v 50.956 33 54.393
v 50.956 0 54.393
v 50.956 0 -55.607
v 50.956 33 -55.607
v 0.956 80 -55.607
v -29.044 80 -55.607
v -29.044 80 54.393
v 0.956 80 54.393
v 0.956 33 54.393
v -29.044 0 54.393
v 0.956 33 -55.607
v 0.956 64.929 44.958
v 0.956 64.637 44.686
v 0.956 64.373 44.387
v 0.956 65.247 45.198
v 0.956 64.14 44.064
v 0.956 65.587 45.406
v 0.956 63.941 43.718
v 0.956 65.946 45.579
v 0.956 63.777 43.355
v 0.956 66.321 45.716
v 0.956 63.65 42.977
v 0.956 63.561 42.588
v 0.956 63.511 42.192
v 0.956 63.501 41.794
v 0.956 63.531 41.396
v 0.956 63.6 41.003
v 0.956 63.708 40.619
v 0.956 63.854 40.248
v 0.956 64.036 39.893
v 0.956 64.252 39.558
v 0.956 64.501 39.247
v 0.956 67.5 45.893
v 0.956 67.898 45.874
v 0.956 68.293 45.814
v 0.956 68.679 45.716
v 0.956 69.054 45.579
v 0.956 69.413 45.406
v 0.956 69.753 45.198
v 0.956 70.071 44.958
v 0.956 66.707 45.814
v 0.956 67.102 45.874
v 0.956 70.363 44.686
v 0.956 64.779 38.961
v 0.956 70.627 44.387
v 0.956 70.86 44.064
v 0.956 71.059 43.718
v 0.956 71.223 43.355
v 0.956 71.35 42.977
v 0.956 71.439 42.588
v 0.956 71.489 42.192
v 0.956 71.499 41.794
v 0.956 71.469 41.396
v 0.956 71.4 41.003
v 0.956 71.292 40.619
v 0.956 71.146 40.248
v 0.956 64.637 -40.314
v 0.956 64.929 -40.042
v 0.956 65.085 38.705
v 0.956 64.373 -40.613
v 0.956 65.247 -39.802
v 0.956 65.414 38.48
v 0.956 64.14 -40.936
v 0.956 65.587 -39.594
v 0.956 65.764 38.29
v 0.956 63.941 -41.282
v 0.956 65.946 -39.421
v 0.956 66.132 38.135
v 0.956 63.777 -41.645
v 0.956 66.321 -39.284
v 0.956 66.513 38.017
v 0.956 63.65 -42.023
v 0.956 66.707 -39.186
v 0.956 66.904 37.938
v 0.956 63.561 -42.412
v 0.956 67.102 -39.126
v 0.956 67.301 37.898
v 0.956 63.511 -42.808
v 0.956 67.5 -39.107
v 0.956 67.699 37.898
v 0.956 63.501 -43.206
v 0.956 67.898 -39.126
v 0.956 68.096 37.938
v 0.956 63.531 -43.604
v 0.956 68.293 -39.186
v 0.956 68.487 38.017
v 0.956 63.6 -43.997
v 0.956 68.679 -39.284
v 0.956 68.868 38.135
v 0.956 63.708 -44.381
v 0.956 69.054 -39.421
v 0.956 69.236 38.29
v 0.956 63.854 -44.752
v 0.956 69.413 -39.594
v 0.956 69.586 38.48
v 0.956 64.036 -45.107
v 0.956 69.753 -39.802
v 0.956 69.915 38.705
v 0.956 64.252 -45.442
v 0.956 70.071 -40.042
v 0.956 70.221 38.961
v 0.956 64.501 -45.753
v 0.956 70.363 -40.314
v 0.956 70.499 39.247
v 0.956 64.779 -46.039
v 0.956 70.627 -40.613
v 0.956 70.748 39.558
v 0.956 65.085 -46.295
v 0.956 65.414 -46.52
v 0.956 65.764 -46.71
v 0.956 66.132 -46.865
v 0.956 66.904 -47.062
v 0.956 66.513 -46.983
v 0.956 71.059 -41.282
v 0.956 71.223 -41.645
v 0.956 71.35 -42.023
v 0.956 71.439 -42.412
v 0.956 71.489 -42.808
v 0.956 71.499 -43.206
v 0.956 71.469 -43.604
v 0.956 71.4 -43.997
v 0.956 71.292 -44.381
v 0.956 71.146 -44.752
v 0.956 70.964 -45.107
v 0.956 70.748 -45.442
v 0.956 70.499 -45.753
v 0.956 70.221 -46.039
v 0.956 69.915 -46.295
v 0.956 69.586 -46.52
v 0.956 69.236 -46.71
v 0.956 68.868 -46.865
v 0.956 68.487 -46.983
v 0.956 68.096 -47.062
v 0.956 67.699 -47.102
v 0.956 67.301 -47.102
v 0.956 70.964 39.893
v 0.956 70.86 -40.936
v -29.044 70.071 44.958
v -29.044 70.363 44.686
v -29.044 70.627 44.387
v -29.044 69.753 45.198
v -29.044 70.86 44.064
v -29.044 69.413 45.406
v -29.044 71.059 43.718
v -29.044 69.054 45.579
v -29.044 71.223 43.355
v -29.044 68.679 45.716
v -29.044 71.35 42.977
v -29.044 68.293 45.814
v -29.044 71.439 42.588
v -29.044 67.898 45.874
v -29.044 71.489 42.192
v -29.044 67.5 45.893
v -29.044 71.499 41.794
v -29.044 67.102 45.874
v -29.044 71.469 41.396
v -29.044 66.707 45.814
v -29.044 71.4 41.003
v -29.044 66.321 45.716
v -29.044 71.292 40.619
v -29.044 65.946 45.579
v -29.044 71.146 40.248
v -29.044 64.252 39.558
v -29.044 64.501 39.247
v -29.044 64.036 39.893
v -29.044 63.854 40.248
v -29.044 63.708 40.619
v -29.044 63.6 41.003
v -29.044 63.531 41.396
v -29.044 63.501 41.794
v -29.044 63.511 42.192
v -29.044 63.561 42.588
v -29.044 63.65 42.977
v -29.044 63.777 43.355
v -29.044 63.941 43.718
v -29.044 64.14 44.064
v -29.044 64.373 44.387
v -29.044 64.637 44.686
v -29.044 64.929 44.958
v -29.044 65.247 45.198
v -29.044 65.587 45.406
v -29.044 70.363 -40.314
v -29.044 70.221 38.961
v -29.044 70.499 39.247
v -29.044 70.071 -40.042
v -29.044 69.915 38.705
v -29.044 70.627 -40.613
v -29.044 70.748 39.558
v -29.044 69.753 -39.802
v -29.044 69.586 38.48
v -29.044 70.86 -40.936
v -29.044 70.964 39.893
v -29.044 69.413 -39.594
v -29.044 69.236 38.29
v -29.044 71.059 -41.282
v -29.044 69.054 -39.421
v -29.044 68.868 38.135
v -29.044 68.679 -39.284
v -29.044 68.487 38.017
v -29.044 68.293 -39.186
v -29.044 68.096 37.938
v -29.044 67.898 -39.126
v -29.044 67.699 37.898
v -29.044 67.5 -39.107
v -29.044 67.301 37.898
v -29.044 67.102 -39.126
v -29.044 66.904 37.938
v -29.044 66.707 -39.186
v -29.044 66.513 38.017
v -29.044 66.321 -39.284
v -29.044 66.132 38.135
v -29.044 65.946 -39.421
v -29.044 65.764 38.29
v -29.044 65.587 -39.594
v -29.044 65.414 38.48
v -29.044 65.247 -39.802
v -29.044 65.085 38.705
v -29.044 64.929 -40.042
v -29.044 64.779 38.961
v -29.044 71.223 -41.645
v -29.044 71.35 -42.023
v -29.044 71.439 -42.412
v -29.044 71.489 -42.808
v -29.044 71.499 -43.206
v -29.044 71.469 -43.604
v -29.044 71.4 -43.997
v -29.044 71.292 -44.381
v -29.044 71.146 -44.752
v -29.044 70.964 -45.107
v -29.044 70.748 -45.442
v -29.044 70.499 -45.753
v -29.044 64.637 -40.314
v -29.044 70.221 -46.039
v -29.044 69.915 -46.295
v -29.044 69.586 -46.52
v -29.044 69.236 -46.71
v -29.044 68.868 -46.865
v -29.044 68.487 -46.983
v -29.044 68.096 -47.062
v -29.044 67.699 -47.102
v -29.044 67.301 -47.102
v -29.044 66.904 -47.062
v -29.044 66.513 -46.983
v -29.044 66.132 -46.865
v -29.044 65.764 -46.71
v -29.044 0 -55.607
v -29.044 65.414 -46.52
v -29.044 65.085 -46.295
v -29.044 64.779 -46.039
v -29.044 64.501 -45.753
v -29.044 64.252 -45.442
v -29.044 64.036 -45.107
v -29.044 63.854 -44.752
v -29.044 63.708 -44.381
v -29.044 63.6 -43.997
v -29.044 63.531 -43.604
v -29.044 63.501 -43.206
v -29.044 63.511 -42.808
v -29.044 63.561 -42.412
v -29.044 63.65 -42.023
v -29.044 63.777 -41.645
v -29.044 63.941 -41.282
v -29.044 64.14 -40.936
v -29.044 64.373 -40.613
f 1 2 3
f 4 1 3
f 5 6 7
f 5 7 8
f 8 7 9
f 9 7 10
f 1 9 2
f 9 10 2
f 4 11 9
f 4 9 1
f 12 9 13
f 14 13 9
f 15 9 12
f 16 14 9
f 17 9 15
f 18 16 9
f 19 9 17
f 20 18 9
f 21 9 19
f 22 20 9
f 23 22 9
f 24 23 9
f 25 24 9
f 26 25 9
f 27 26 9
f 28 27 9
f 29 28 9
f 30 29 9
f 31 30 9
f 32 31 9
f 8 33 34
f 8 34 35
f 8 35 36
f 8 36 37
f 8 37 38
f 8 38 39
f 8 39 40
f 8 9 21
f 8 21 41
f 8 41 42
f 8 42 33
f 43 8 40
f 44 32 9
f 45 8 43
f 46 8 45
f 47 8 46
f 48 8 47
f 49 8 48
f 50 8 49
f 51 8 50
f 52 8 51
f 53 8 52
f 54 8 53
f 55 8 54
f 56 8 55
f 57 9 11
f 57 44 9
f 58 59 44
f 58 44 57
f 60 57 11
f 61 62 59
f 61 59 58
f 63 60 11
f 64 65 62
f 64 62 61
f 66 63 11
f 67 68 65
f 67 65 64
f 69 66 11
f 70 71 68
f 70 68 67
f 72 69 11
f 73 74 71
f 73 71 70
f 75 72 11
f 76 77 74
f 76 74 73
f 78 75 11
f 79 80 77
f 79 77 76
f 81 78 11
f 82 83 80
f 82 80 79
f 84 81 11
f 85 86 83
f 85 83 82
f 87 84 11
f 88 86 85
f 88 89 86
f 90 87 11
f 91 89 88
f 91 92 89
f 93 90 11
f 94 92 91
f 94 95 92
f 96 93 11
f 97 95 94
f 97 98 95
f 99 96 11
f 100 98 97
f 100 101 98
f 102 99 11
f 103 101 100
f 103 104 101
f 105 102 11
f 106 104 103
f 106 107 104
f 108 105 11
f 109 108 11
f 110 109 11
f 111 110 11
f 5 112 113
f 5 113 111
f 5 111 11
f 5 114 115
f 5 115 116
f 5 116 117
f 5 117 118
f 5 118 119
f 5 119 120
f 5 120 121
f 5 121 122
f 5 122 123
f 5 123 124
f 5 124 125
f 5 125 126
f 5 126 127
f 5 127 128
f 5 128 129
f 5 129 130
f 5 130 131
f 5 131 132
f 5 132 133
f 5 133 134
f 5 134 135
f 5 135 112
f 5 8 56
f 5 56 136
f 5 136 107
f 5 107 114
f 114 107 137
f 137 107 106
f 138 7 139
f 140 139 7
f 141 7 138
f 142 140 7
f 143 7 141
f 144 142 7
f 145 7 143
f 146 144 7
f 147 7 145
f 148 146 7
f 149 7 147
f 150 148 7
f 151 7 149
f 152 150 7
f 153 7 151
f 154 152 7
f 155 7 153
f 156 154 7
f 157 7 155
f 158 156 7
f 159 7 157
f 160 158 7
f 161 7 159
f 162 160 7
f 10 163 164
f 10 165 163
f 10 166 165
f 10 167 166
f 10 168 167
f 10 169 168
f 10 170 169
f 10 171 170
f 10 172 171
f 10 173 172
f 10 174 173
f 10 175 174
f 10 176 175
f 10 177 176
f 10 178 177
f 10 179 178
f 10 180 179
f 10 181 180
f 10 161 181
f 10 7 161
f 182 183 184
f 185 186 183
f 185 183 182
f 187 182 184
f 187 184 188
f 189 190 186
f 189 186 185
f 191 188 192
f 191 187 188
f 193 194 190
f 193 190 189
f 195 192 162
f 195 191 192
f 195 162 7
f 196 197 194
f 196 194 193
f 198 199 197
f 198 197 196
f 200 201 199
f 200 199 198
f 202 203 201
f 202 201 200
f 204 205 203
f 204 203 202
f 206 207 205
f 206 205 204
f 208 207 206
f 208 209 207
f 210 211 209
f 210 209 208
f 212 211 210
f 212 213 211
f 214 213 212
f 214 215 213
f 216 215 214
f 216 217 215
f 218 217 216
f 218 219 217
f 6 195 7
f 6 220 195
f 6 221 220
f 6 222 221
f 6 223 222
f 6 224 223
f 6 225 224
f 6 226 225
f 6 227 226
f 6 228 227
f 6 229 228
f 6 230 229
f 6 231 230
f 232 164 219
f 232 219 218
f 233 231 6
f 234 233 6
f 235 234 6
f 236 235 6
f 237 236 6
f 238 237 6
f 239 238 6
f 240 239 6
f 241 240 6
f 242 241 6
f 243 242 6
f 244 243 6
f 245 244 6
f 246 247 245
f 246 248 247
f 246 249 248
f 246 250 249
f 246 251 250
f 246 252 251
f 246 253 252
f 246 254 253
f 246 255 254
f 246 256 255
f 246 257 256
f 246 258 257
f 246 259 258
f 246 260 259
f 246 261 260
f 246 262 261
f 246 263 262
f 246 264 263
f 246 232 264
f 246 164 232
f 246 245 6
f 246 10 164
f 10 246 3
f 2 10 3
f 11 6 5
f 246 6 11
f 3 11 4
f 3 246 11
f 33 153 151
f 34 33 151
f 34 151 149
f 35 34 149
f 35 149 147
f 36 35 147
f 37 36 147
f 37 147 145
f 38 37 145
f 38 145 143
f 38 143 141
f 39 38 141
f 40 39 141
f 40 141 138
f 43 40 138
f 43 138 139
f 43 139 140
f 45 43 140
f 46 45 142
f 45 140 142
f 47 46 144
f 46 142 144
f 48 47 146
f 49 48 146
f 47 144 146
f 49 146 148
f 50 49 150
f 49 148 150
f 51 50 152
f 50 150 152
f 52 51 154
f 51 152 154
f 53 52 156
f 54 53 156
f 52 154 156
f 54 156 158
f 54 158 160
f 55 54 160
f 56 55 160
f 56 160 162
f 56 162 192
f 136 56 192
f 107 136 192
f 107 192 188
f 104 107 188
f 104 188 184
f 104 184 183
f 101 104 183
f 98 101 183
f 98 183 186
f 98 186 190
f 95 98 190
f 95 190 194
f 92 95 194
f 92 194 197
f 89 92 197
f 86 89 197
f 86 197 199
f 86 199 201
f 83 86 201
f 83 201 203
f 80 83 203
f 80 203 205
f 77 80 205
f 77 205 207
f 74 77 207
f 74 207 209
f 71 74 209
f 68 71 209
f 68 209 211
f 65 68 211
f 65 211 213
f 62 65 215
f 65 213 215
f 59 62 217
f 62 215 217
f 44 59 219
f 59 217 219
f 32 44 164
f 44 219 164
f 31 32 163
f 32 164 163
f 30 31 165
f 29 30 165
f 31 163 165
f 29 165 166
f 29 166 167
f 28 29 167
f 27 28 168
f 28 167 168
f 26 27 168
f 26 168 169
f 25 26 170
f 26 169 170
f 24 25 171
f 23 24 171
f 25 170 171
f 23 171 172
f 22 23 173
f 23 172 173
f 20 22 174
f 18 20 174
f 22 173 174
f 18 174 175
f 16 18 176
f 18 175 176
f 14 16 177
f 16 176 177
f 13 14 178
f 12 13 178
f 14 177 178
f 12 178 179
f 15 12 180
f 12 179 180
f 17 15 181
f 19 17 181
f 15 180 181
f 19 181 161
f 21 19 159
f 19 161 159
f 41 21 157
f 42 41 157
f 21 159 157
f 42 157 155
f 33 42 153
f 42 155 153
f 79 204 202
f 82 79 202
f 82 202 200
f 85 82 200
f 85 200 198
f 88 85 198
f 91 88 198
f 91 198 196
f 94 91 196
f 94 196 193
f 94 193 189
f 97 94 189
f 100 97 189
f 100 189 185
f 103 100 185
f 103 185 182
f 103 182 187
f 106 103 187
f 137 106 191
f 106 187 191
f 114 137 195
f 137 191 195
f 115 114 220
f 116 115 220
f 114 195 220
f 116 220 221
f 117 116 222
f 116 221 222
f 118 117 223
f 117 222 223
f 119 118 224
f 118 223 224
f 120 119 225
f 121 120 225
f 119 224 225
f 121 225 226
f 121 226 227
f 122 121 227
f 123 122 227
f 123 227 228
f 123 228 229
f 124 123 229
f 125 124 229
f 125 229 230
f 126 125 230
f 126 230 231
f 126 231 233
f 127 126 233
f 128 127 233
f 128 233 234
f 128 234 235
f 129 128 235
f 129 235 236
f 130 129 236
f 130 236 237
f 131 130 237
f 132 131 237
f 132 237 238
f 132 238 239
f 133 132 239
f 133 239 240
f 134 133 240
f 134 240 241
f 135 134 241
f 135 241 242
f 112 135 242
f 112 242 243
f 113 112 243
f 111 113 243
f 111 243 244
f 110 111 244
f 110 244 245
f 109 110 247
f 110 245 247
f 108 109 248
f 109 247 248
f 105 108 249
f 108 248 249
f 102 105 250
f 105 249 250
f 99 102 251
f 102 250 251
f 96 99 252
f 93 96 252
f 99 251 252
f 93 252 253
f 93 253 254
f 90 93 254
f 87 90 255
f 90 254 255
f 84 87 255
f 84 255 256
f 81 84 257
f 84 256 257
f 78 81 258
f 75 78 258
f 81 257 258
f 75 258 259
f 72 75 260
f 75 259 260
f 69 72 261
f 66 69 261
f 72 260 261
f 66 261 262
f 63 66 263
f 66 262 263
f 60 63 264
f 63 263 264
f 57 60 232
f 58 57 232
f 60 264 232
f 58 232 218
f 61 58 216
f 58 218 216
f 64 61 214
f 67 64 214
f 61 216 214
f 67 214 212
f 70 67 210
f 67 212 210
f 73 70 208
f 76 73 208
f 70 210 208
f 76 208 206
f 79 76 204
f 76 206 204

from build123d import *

# Parameters (mm, degrees)
SKETCH1_W           = 80
SKETCH1_H           = 110
BOSS_EXTRUDE1_DEPTH = 80
SKETCH2_W           = 50
SKETCH2_H           = 110
CUT_EXTRUDE2_DEPTH  = 47
SKETCH3_R           = 4
CUT_EXTRUDE3_DEPTH  = 81


with BuildPart() as part:
    # Sketch1 → Boss-Extrude1 (new body)
    with BuildSketch(Plane(origin=(0, 0, 0), x_dir=(1, 0, 0), z_dir=(0, 1, 0))):
        with Locations((10.955882353, 0.606617647)):
            Rectangle(SKETCH1_W, SKETCH1_H)
    extrude(amount=BOSS_EXTRUDE1_DEPTH)

    # Sketch2 → Cut-Extrude2 (cut)
    with BuildSketch(Plane(origin=(0, 80, 0), x_dir=(1, 0, 0), z_dir=(0, 1, 0))):
        with Locations((25.955882353, 0.606617647)):
            Rectangle(SKETCH2_W, SKETCH2_H)
    extrude(amount=-CUT_EXTRUDE2_DEPTH, mode=Mode.SUBTRACT)

    # Sketch3 → Cut-Extrude3 (cut, through all)
    with BuildSketch(Plane.ZY.offset(29.044117647)):
        with Locations((41.893382353, 67.5)):
            Circle(SKETCH3_R)
        with Locations((-43.106617647, 67.5)):
            Circle(SKETCH3_R)
    extrude(amount=-CUT_EXTRUDE3_DEPTH, mode=Mode.SUBTRACT)


solid = part.part
